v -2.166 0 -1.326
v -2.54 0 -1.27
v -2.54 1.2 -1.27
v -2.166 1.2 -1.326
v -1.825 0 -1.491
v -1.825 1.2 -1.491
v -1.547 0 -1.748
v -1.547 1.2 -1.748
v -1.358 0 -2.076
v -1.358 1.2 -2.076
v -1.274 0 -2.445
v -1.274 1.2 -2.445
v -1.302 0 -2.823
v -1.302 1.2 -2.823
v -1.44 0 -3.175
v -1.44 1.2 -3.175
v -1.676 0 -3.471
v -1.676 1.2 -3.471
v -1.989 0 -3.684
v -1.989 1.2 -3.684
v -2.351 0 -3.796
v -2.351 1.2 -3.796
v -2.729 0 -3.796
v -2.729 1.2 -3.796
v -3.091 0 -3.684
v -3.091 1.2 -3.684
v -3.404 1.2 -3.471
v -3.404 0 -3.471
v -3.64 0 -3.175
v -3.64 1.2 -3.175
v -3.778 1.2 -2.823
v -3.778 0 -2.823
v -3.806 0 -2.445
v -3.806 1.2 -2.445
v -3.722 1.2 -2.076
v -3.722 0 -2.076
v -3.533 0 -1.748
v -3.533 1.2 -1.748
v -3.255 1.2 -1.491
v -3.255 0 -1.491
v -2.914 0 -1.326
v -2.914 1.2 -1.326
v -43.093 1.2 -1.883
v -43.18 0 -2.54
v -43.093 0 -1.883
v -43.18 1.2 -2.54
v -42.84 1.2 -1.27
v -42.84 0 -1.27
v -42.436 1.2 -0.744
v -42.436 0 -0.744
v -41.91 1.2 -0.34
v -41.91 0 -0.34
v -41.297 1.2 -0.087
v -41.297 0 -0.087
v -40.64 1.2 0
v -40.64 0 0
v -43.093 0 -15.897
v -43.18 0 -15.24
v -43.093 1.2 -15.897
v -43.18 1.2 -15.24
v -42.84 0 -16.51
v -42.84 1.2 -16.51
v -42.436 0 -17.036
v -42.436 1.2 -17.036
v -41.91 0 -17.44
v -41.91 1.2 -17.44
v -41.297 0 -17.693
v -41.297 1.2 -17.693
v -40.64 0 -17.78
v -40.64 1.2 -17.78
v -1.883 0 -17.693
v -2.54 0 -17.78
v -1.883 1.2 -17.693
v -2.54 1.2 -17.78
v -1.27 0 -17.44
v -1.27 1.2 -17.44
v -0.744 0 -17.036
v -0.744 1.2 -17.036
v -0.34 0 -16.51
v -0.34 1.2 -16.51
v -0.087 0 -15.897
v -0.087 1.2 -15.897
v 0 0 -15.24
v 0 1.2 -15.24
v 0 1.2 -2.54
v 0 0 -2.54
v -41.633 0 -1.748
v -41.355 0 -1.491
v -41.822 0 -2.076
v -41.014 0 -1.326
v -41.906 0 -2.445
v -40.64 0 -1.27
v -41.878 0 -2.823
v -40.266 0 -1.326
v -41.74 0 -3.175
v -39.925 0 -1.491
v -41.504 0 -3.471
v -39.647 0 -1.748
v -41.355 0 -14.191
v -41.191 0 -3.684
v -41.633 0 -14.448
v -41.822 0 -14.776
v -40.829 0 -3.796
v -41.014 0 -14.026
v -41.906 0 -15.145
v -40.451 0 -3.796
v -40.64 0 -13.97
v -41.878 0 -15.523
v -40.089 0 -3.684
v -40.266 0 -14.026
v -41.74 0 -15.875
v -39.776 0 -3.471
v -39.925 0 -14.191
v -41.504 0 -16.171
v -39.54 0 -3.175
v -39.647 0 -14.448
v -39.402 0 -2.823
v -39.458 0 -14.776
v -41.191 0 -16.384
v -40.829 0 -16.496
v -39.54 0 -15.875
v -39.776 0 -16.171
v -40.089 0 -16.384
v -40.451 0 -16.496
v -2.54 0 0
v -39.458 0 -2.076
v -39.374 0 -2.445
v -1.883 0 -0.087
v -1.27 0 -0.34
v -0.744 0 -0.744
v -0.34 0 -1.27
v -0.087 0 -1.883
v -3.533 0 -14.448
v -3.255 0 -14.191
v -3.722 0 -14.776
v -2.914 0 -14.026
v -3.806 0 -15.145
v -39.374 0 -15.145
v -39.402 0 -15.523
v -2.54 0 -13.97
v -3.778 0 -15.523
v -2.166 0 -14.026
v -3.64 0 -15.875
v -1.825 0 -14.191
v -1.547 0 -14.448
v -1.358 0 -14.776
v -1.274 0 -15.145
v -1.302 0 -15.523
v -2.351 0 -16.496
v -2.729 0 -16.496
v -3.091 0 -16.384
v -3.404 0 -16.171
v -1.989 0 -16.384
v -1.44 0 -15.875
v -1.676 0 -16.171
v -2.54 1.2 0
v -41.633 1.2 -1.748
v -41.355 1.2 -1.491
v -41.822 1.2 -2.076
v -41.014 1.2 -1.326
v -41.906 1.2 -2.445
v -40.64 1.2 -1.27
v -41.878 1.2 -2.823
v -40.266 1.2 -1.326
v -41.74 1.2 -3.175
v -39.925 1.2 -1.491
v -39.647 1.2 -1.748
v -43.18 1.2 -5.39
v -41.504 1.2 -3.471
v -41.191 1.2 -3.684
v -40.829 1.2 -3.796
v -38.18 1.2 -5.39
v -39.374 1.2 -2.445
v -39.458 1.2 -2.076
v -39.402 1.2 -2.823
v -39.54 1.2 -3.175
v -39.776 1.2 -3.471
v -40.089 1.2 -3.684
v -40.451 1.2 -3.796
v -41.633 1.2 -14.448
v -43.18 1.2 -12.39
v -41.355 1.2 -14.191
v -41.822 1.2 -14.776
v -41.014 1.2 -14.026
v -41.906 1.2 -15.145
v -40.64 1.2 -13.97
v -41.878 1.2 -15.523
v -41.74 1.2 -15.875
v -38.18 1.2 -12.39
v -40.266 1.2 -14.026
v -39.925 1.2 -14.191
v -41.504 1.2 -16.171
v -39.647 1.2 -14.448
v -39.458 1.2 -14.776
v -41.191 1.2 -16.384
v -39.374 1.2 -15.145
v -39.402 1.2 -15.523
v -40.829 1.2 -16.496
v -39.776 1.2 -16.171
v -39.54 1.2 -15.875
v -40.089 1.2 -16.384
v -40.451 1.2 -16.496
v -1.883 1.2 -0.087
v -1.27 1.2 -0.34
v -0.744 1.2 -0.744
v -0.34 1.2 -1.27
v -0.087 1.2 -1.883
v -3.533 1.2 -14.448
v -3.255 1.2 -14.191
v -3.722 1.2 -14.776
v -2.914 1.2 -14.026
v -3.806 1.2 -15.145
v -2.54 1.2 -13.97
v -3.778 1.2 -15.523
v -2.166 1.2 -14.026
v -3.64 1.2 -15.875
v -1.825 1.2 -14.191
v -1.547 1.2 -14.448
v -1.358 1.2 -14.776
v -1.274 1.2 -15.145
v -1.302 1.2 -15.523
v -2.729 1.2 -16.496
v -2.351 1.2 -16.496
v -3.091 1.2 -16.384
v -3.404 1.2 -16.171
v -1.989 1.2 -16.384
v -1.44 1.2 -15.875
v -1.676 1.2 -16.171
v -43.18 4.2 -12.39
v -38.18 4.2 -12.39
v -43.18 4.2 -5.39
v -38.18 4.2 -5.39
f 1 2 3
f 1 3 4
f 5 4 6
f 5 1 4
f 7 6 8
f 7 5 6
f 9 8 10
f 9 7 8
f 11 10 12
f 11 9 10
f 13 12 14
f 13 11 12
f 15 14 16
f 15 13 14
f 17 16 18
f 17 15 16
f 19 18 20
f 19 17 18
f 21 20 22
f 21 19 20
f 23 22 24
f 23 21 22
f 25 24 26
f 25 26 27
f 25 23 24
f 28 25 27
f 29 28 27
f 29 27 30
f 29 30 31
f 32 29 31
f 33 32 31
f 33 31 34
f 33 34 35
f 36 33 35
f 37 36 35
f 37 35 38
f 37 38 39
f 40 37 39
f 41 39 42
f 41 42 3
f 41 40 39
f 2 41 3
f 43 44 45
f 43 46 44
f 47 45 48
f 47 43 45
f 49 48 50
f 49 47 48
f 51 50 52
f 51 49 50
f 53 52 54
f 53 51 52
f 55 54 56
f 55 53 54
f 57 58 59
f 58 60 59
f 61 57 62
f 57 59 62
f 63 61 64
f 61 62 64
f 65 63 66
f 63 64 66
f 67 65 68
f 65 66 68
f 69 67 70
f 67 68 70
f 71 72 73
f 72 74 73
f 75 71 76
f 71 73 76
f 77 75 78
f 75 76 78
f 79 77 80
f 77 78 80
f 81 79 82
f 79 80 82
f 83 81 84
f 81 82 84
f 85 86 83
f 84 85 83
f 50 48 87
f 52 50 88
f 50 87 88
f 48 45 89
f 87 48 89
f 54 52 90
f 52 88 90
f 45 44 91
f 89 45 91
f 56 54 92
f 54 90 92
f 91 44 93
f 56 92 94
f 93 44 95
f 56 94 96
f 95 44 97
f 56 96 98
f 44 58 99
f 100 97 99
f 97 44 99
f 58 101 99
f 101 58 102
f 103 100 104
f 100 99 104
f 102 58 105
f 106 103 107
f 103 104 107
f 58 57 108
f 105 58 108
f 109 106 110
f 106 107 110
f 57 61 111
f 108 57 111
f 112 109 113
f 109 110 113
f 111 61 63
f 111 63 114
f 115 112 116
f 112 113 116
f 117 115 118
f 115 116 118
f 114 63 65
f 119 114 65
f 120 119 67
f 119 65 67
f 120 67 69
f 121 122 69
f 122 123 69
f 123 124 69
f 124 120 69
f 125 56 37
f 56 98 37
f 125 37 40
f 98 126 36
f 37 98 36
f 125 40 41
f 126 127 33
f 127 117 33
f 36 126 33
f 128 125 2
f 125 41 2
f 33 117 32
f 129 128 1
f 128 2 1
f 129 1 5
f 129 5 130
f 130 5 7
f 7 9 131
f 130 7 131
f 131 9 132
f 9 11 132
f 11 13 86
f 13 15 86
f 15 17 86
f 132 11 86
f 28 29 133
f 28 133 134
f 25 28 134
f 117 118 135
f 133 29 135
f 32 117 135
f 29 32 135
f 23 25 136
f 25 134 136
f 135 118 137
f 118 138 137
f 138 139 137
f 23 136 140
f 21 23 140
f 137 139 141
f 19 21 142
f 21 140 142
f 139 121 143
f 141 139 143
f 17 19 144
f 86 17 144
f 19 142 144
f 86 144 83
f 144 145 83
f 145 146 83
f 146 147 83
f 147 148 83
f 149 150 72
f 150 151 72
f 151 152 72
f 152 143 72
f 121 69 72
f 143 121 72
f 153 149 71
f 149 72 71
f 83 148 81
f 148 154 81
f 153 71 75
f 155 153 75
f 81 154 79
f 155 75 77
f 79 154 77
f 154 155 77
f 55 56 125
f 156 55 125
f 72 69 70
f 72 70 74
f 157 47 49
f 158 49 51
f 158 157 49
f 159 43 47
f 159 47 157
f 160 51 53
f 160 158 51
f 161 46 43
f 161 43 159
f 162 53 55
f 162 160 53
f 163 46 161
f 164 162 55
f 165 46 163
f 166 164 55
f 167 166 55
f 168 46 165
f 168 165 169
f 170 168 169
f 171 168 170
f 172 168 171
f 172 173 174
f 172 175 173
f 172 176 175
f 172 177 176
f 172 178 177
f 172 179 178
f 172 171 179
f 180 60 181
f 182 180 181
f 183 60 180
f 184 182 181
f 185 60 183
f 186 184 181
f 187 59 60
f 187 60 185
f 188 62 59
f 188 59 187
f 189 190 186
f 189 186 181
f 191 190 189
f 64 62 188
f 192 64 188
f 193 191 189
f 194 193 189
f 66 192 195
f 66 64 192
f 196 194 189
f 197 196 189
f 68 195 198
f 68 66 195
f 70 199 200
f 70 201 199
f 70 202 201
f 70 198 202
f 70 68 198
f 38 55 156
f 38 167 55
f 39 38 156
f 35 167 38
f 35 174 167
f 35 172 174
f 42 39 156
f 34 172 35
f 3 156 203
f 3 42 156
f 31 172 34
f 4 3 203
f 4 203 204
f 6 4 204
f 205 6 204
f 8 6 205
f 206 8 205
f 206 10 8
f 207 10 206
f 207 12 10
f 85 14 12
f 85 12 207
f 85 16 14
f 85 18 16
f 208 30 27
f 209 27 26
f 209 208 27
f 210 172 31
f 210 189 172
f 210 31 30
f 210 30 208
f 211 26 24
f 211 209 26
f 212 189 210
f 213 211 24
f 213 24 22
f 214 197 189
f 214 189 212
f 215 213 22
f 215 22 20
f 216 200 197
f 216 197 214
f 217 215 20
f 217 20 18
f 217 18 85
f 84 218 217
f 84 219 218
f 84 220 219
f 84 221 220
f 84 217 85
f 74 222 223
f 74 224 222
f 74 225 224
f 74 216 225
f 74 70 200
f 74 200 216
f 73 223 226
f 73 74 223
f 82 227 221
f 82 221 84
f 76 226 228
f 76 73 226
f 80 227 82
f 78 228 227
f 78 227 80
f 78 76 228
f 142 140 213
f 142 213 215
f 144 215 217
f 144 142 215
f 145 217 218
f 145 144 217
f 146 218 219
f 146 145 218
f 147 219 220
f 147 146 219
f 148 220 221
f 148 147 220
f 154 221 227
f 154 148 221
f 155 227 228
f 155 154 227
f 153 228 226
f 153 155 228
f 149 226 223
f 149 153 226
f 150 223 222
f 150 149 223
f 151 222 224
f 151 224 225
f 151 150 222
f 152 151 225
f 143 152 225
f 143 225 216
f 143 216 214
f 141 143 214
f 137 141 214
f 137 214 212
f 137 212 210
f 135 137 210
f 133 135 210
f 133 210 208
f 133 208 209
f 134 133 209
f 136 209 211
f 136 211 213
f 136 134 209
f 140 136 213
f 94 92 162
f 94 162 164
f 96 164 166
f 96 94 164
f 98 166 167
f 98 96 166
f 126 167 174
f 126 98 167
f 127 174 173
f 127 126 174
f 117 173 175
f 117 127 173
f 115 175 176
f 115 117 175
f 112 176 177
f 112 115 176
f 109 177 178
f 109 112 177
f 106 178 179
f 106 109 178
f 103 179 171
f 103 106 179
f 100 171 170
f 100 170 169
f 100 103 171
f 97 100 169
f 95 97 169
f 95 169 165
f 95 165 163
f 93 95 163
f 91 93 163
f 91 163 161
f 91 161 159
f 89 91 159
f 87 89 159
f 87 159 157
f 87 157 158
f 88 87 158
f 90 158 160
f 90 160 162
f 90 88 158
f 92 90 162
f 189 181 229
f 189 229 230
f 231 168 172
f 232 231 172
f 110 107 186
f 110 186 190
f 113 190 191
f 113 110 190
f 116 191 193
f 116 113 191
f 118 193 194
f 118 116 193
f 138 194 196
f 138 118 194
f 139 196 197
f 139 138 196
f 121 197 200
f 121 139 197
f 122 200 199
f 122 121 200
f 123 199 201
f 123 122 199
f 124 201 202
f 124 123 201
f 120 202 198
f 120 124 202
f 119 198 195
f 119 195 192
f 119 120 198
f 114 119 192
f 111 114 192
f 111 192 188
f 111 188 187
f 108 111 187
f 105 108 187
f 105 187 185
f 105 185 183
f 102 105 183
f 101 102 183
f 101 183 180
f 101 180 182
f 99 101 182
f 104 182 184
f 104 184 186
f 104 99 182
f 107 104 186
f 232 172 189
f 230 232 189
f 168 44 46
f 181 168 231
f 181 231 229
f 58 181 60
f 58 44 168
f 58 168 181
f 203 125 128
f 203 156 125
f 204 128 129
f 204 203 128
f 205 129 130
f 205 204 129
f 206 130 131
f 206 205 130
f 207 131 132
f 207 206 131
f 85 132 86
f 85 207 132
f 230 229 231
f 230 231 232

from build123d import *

# Parameters (mm, degrees)
SKETCH1_W           = 43.18
SKETCH1_H           = 17.78
SKETCH1_R           = 1.27
BOSS_EXTRUDE1_DEPTH = 1.2
FILLET1_R           = 2.54
SKETCH2_W           = 5
SKETCH2_H           = 7
BOSS_EXTRUDE2_DEPTH = 3


with BuildPart() as part:
    # Sketch1 → Boss-Extrude1 (new body)
    with BuildSketch(Plane(origin=(0, 0, 0), x_dir=(1, 0, 0), z_dir=(0, 1, 0))):
        with Locations((-21.59, 8.89)):
            Rectangle(SKETCH1_W, SKETCH1_H)
        with Locations(Location((-40.64, 15.24, 0), (0, 0, 270))):
            Circle(SKETCH1_R, mode=Mode.SUBTRACT)
        with Locations(Location((-40.64, 2.54, 0), (0, 0, 270))):
            Circle(SKETCH1_R, mode=Mode.SUBTRACT)
        with Locations(Location((-2.54, 2.54, 0), (0, 0, 270))):
            Circle(SKETCH1_R, mode=Mode.SUBTRACT)
        with Locations(Location((-2.54, 15.24, 0), (0, 0, 270))):
            Circle(SKETCH1_R, mode=Mode.SUBTRACT)
    extrude(amount=BOSS_EXTRUDE1_DEPTH)

    # Fillet1
    fillet1_edges = [part.edges().sort_by_distance(p)[0] for p in [
        (0, 0.6, 0),
        (-43.18, 0.6, 0),
        (-43.18, 0.6, -17.78),
        (0, 0.6, -17.78),
    ]]
    fillet(fillet1_edges, radius=FILLET1_R)

    # Sketch2 → Boss-Extrude2 (add)
    with BuildSketch(Plane(origin=(0, 1.2, 0), x_dir=(1, 0, 0), z_dir=(0, 1, 0))):
        with Locations((-40.68, 8.89)):
            Rectangle(SKETCH2_W, SKETCH2_H)
    extrude(amount=BOSS_EXTRUDE2_DEPTH)


solid = part.part
